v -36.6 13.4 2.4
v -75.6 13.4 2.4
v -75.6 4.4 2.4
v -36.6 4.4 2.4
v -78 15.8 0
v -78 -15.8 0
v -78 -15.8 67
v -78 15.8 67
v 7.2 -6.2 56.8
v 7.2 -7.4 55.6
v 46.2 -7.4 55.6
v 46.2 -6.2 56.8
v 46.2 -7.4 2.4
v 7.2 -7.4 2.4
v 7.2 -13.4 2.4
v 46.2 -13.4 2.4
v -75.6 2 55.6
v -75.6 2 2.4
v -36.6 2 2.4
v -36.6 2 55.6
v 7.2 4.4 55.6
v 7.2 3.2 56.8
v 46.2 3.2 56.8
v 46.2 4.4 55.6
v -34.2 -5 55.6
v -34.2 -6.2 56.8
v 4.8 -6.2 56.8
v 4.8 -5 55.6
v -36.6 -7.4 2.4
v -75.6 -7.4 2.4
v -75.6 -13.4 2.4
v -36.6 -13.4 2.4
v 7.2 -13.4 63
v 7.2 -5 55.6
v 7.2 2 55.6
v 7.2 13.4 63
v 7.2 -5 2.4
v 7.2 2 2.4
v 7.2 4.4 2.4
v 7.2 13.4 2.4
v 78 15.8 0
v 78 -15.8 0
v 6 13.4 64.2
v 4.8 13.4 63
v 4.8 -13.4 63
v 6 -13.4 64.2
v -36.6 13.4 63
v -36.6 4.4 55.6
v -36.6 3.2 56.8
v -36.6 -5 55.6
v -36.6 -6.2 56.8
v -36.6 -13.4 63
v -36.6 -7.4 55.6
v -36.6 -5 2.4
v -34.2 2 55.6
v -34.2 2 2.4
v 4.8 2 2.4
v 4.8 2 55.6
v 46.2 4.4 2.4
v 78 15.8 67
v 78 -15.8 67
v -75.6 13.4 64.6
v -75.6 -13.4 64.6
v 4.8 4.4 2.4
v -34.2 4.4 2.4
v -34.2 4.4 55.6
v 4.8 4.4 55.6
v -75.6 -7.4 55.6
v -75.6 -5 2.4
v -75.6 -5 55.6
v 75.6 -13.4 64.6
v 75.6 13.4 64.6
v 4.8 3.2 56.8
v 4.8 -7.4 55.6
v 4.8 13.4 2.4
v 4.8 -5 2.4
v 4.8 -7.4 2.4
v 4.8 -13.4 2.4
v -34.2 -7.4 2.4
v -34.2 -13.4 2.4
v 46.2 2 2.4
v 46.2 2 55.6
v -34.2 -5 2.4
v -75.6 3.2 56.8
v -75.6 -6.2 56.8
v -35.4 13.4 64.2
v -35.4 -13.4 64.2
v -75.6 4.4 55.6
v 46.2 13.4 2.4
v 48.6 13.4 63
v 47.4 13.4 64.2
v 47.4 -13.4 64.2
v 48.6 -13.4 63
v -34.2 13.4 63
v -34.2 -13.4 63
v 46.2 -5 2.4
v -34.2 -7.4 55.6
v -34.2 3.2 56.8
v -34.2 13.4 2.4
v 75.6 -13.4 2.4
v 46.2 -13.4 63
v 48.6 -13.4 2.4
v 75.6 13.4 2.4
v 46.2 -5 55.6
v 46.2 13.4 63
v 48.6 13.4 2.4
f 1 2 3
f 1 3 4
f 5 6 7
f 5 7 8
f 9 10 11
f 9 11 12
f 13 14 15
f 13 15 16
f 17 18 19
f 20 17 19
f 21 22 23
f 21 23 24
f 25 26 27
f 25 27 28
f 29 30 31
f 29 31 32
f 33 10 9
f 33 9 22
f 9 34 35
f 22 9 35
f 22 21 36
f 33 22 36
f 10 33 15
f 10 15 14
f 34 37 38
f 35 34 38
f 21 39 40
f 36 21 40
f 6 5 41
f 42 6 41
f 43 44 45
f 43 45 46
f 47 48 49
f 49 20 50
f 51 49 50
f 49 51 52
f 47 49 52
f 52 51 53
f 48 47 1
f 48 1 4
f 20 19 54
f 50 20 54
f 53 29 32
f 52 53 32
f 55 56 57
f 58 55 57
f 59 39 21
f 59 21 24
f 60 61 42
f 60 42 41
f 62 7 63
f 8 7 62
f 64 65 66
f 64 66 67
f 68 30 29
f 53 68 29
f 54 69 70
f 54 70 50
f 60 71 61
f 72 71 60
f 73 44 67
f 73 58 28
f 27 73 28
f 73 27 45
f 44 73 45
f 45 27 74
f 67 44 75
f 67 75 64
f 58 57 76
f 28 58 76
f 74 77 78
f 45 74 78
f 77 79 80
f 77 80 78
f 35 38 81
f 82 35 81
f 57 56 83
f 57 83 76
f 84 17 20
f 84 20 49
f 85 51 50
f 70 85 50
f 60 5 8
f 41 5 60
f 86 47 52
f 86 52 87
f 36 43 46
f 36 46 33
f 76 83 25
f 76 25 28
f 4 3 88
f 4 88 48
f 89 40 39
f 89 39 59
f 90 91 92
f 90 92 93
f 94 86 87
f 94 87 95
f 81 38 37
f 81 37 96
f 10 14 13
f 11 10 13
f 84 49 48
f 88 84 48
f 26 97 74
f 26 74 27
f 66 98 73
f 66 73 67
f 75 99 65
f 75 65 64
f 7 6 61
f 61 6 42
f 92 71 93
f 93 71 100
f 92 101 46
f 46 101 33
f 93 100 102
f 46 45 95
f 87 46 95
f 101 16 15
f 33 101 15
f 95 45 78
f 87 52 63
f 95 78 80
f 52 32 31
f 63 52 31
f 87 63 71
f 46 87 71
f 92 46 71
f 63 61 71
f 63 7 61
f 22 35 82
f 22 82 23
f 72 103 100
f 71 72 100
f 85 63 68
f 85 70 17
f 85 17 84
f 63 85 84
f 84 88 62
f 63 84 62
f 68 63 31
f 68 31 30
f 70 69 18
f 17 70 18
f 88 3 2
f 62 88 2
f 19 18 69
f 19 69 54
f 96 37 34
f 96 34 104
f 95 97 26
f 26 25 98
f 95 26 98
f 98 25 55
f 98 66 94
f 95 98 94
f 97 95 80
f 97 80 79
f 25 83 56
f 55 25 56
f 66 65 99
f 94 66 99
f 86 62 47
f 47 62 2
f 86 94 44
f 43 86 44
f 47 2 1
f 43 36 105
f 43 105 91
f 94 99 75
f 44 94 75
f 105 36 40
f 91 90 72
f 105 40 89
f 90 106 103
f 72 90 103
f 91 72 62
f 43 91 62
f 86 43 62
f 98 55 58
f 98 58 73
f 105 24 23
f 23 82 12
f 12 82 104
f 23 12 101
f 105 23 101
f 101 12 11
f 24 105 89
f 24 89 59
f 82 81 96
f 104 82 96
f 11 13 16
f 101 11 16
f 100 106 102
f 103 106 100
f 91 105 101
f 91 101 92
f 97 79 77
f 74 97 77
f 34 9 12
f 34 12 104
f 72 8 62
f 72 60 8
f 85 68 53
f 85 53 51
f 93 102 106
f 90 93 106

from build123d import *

# Parameters (mm, degrees)
F0_W          = 156
F0_H          = 31.6
F1_DEPTH      = 67
F0_W_2        = 2.4
F0_H_2        = 6
F0_H_3        = 2.4
F0_H_4        = 7
F0_H_5        = 9
F2_DEPTH      = 65.4
F0_W_3        = 39
F3_DEPTH      = 58
F4_DEPTH      = 2.4
F0_W_4        = 27
F5_DEPTH      = 2.4
F6_T1_DEPTH   = 39
F6_T3_DEPTH   = 39
F6_T5_DEPTH   = 39
F6_T7_DEPTH   = 26.8
F6_T12_DEPTH  = 51.3440783422
F6_T17_DEPTH  = 51.3440783422
F6_T22_DEPTH  = 51.3440783422
F6_T27_DEPTH  = 51.3440783422
F6_T32_DEPTH  = 51.3440783422
F6_T37_DEPTH  = 51.3440783422
F6_T42_DEPTH  = 51.3440783422
F6_T47_DEPTH  = 51.3440783422
F6_T52_DEPTH  = 51.3440783422
F6_T57_DEPTH  = 51.3440783422
F6_T62_DEPTH  = 51.3440783422
F6_T67_DEPTH  = 51.3440783422
F6_T72_DEPTH  = 51.3440783422
F6_T77_DEPTH  = 51.3440783422
F6_T82_DEPTH  = 51.3440783422
F6_T87_DEPTH  = 51.3440783422
F6_T92_DEPTH  = 163.5440783422
F6_T98_DEPTH  = 163.5440783422
F6_T104_DEPTH = 39.1440783422
F6_T110_DEPTH = 39.1440783422


# Not quite as in the source:
# - a fillet or chamfer that OpenCascade refuses, or shapes differently, is made with other operations: its cross-section is extruded or revolved along the edge and cut away or added


with BuildPart() as f1:
    # F0 (on Top) → F1 (new body)
    with BuildSketch(Plane.XY):
        Rectangle(F0_W, F0_H)
        Polygon((48.6, 13.4), (75.6, 13.4), (75.6, 4.4), (75.6, 2), (75.6, -5), (75.6, -7.4), (75.6, -13.4), (48.6, -13.4), (46.2, -13.4), (7.2, -13.4), (4.8, -13.4), (-34.2, -13.4), (-36.6, -13.4), (-75.6, -13.4), (-75.6, -7.4), (-75.6, -5), (-75.6, 2), (-75.6, 4.4), (-75.6, 13.4), (-36.6, 13.4), (-34.2, 13.4), (4.8, 13.4), (7.2, 13.4), (46.2, 13.4), align=None, mode=Mode.SUBTRACT)
    extrude(amount=F1_DEPTH)

    # F0 (on Top) → F2 (join)
    with BuildSketch(Plane.XY):
        with Locations((47.4, -10.4)):
            Rectangle(F0_W_2, F0_H_2)
        with Locations((47.4, -6.2)):
            Rectangle(F0_W_2, F0_H_3)
        with Locations((47.4, -1.5)):
            Rectangle(F0_W_2, F0_H_4)
        with Locations((47.4, 3.2)):
            Rectangle(F0_W_2, F0_H_3)
        with Locations((47.4, 8.9)):
            Rectangle(F0_W_2, F0_H_5)
        with Locations((6, 8.9)):
            Rectangle(F0_W_2, F0_H_5)
        with Locations((6, 3.2)):
            Rectangle(F0_W_2, F0_H_3)
        with Locations((6, -1.5)):
            Rectangle(F0_W_2, F0_H_4)
        with Locations((6, -6.2)):
            Rectangle(F0_W_2, F0_H_3)
        with Locations((6, -10.4)):
            Rectangle(F0_W_2, F0_H_2)
        with Locations((-35.4, -10.4)):
            Rectangle(F0_W_2, F0_H_2)
        with Locations((-35.4, -6.2)):
            Rectangle(F0_W_2, F0_H_3)
        with Locations((-35.4, -1.5)):
            Rectangle(F0_W_2, F0_H_4)
        with Locations((-35.4, 3.2)):
            Rectangle(F0_W_2, F0_H_3)
        with Locations((-35.4, 8.9)):
            Rectangle(F0_W_2, F0_H_5)
    extrude(amount=F2_DEPTH)

    # F0 (on Top) → F3 (join)
    with BuildSketch(Plane.XY):
        with Locations((-56.1, -6.2)):
            Rectangle(F0_W_3, F0_H_3)
        with Locations((-56.1, 3.2)):
            Rectangle(F0_W_3, F0_H_3)
        with Locations((-14.7, -6.2)):
            Rectangle(F0_W_3, F0_H_3)
        with Locations((-14.7, 3.2)):
            Rectangle(F0_W_3, F0_H_3)
        with Locations((26.7, 3.2)):
            Rectangle(F0_W_3, F0_H_3)
        with Locations((26.7, -6.2)):
            Rectangle(F0_W_3, F0_H_3)
    extrude(amount=F3_DEPTH)

    # F0 (on Top) → F4 (join)
    with BuildSketch(Plane.XY):
        with Locations((-56.1, -10.4)):
            Rectangle(F0_W_3, F0_H_2)
        with Locations((-56.1, -1.5)):
            Rectangle(F0_W_3, F0_H_4)
        with Locations((-56.1, 8.9)):
            Rectangle(F0_W_3, F0_H_5)
        with Locations((-14.7, 8.9)):
            Rectangle(F0_W_3, F0_H_5)
        with Locations((-14.7, -1.5)):
            Rectangle(F0_W_3, F0_H_4)
        with Locations((-14.7, -10.4)):
            Rectangle(F0_W_3, F0_H_2)
        with Locations((26.7, -10.4)):
            Rectangle(F0_W_3, F0_H_2)
        with Locations((26.7, -1.5)):
            Rectangle(F0_W_3, F0_H_4)
        with Locations((26.7, 8.9)):
            Rectangle(F0_W_3, F0_H_5)
    extrude(amount=F4_DEPTH)

    # F0 (on Top) → F5 (join)
    with BuildSketch(Plane.XY):
        with Locations((62.1, 8.9)):
            Rectangle(F0_W_4, F0_H_5)
        with Locations((62.1, 3.2)):
            Rectangle(F0_W_4, F0_H_3)
        with Locations((62.1, -1.5)):
            Rectangle(F0_W_4, F0_H_4)
        with Locations((62.1, -6.2)):
            Rectangle(F0_W_4, F0_H_3)
        with Locations((62.1, -10.4)):
            Rectangle(F0_W_4, F0_H_2)
    extrude(amount=F5_DEPTH)

    # F6: chamfer of 2.4 on 22 edges, made by hand

    # F6_s2 → F6_t1 (cut)
    with BuildSketch(Plane.YZ.offset(-75.6)):
        Polygon((2, 55.6), (4.4, 58), (2, 58), align=None)
        Polygon((2, 58), (4.4, 55.6), (4.4, 58), align=None)
        Polygon((-7.4, 58), (-5, 55.6), (-5, 58), align=None)
        Polygon((-7.4, 55.6), (-5, 58), (-7.4, 58), align=None)
    extrude(amount=F6_T1_DEPTH, mode=Mode.SUBTRACT)

    # F6_s4 → F6_t3 (cut)
    with BuildSketch(Plane.YZ.offset(-34.2)):
        Polygon((-7.4, 55.6), (-5, 58), (-7.4, 58), align=None)
        Polygon((-7.4, 58), (-5, 55.6), (-5, 58), align=None)
        Polygon((2, 58), (4.4, 55.6), (4.4, 58), align=None)
        Polygon((2, 55.6), (4.4, 58), (2, 58), align=None)
    extrude(amount=F6_T3_DEPTH, mode=Mode.SUBTRACT)

    # F6_s6 → F6_t5 (cut)
    with BuildSketch(Plane.YZ.offset(7.2)):
        Polygon((2, 55.6), (4.4, 58), (2, 58), align=None)
        Polygon((2, 58), (4.4, 55.6), (4.4, 58), align=None)
        Polygon((-7.4, 55.6), (-5, 58), (-7.4, 58), align=None)
        Polygon((-7.4, 58), (-5, 55.6), (-5, 58), align=None)
    extrude(amount=F6_T5_DEPTH, mode=Mode.SUBTRACT)

    # F6_s8 → F6_t7 (cut)
    with BuildSketch(Plane.XZ.offset(-13.4)):
        Polygon((-36.6, 63), (-34.2, 65.4), (-36.6, 65.4), align=None)
        Polygon((-36.6, 65.4), (-34.2, 63), (-34.2, 65.4), align=None)
        Polygon((4.8, 63), (7.2, 65.4), (4.8, 65.4), align=None)
        Polygon((4.8, 65.4), (7.2, 63), (7.2, 65.4), align=None)
        Polygon((46.2, 63), (48.6, 65.4), (46.2, 65.4), align=None)
        Polygon((46.2, 65.4), (48.6, 63), (48.6, 65.4), align=None)
    extrude(amount=F6_T7_DEPTH, mode=Mode.SUBTRACT)


with BuildPart() as f6_tool10:
    # F6_s11 → F6_t12 (new body)
    with BuildSketch(Plane.YZ.offset(-81.7720391711)):
        Polygon((2, 55.6), (4.4, 58), (2, 58), align=None)
    extrude(amount=F6_T12_DEPTH)

    split(bisect_by=Plane.YZ.offset(-34.2), keep=Keep.TOP)


with BuildPart() as f1_1:
    add(f1.part)

    # F6_t9: cut F6_tool10
    add(f6_tool10.part, mode=Mode.SUBTRACT)


with BuildPart() as f6_tool15:
    # F6_s16 → F6_t17 (new body)
    with BuildSketch(Plane.YZ.offset(-30.4279608289)):
        Polygon((2, 58), (4.4, 55.6), (4.4, 58), align=None)
    extrude(amount=-F6_T17_DEPTH)

    split(bisect_by=Plane.YZ.offset(-34.2), keep=Keep.TOP)


with BuildPart() as f1_2:
    add(f1_1.part)

    # F6_t14: cut F6_tool15
    add(f6_tool15.part, mode=Mode.SUBTRACT)


with BuildPart() as f6_tool20:
    # F6_s21 → F6_t22 (new body)
    with BuildSketch(Plane.YZ.offset(-30.4279608289)):
        Polygon((-7.4, 58), (-5, 55.6), (-5, 58), align=None)
    extrude(amount=-F6_T22_DEPTH)

    split(bisect_by=Plane.YZ.offset(-34.2), keep=Keep.TOP)


with BuildPart() as f1_3:
    add(f1_2.part)

    # F6_t19: cut F6_tool20
    add(f6_tool20.part, mode=Mode.SUBTRACT)


with BuildPart() as f6_tool25:
    # F6_s26 → F6_t27 (new body)
    with BuildSketch(Plane.YZ.offset(-81.7720391711)):
        Polygon((-7.4, 55.6), (-5, 58), (-7.4, 58), align=None)
    extrude(amount=F6_T27_DEPTH)

    split(bisect_by=Plane.YZ.offset(-34.2), keep=Keep.TOP)


with BuildPart() as f1_4:
    add(f1_3.part)

    # F6_t24: cut F6_tool25
    add(f6_tool25.part, mode=Mode.SUBTRACT)


with BuildPart() as f6_tool30:
    # F6_s31 → F6_t32 (new body)
    with BuildSketch(Plane.YZ.offset(-40.3720391711)):
        Polygon((-7.4, 55.6), (-5, 58), (-7.4, 58), align=None)
    extrude(amount=F6_T32_DEPTH)

    split(bisect_by=Plane.YZ.offset(-36.6), keep=Keep.BOTTOM)


with BuildPart() as f1_5:
    add(f1_4.part)

    # F6_t29: cut F6_tool30
    add(f6_tool30.part, mode=Mode.SUBTRACT)


with BuildPart() as f6_tool35:
    # F6_s36 → F6_t37 (new body)
    with BuildSketch(Plane.YZ.offset(-40.3720391711)):
        Polygon((-7.4, 55.6), (-5, 58), (-7.4, 58), align=None)
    extrude(amount=F6_T37_DEPTH)

    split(bisect_by=Plane.YZ.offset(7.2), keep=Keep.TOP)


with BuildPart() as f1_6:
    add(f1_5.part)

    # F6_t34: cut F6_tool35
    add(f6_tool35.part, mode=Mode.SUBTRACT)


with BuildPart() as f6_tool40:
    # F6_s41 → F6_t42 (new body)
    with BuildSketch(Plane.YZ.offset(10.9720391711)):
        Polygon((-7.4, 58), (-5, 55.6), (-5, 58), align=None)
    extrude(amount=-F6_T42_DEPTH)

    split(bisect_by=Plane.YZ.offset(7.2), keep=Keep.TOP)


with BuildPart() as f1_7:
    add(f1_6.part)

    # F6_t39: cut F6_tool40
    add(f6_tool40.part, mode=Mode.SUBTRACT)


with BuildPart() as f6_tool45:
    # F6_s46 → F6_t47 (new body)
    with BuildSketch(Plane.YZ.offset(10.9720391711)):
        Polygon((-7.4, 58), (-5, 55.6), (-5, 58), align=None)
    extrude(amount=-F6_T47_DEPTH)

    split(bisect_by=Plane.YZ.offset(-36.6), keep=Keep.BOTTOM)


with BuildPart() as f1_8:
    add(f1_7.part)

    # F6_t44: cut F6_tool45
    add(f6_tool45.part, mode=Mode.SUBTRACT)


with BuildPart() as f6_tool50:
    # F6_s51 → F6_t52 (new body)
    with BuildSketch(Plane.YZ.offset(10.9720391711)):
        Polygon((2, 58), (4.4, 55.6), (4.4, 58), align=None)
    extrude(amount=-F6_T52_DEPTH)

    split(bisect_by=Plane.YZ.offset(7.2), keep=Keep.TOP)


with BuildPart() as f1_9:
    add(f1_8.part)

    # F6_t49: cut F6_tool50
    add(f6_tool50.part, mode=Mode.SUBTRACT)


with BuildPart() as f6_tool55:
    # F6_s56 → F6_t57 (new body)
    with BuildSketch(Plane.YZ.offset(10.9720391711)):
        Polygon((2, 58), (4.4, 55.6), (4.4, 58), align=None)
    extrude(amount=-F6_T57_DEPTH)

    split(bisect_by=Plane.YZ.offset(-36.6), keep=Keep.BOTTOM)


with BuildPart() as f1_10:
    add(f1_9.part)

    # F6_t54: cut F6_tool55
    add(f6_tool55.part, mode=Mode.SUBTRACT)


with BuildPart() as f6_tool60:
    # F6_s61 → F6_t62 (new body)
    with BuildSketch(Plane.YZ.offset(-40.3720391711)):
        Polygon((2, 55.6), (4.4, 58), (2, 58), align=None)
    extrude(amount=F6_T62_DEPTH)

    split(bisect_by=Plane.YZ.offset(-36.6), keep=Keep.BOTTOM)


with BuildPart() as f1_11:
    add(f1_10.part)

    # F6_t59: cut F6_tool60
    add(f6_tool60.part, mode=Mode.SUBTRACT)


with BuildPart() as f6_tool65:
    # F6_s66 → F6_t67 (new body)
    with BuildSketch(Plane.YZ.offset(-40.3720391711)):
        Polygon((2, 55.6), (4.4, 58), (2, 58), align=None)
    extrude(amount=F6_T67_DEPTH)

    split(bisect_by=Plane.YZ.offset(7.2), keep=Keep.TOP)


with BuildPart() as f1_12:
    add(f1_11.part)

    # F6_t64: cut F6_tool65
    add(f6_tool65.part, mode=Mode.SUBTRACT)


with BuildPart() as f6_tool70:
    # F6_s71 → F6_t72 (new body)
    with BuildSketch(Plane.YZ.offset(1.0279608289)):
        Polygon((2, 55.6), (4.4, 58), (2, 58), align=None)
    extrude(amount=F6_T72_DEPTH)

    split(bisect_by=Plane.YZ.offset(4.8), keep=Keep.BOTTOM)


with BuildPart() as f1_13:
    add(f1_12.part)

    # F6_t69: cut F6_tool70
    add(f6_tool70.part, mode=Mode.SUBTRACT)


with BuildPart() as f6_tool75:
    # F6_s76 → F6_t77 (new body)
    with BuildSketch(Plane.YZ.offset(52.3720391711)):
        Polygon((2, 58), (4.4, 55.6), (4.4, 58), align=None)
    extrude(amount=-F6_T77_DEPTH)

    split(bisect_by=Plane.YZ.offset(4.8), keep=Keep.BOTTOM)


with BuildPart() as f1_14:
    add(f1_13.part)

    # F6_t74: cut F6_tool75
    add(f6_tool75.part, mode=Mode.SUBTRACT)


with BuildPart() as f6_tool80:
    # F6_s81 → F6_t82 (new body)
    with BuildSketch(Plane.YZ.offset(1.0279608289)):
        Polygon((-7.4, 55.6), (-5, 58), (-7.4, 58), align=None)
    extrude(amount=F6_T82_DEPTH)

    split(bisect_by=Plane.YZ.offset(4.8), keep=Keep.BOTTOM)


with BuildPart() as f1_15:
    add(f1_14.part)

    # F6_t79: cut F6_tool80
    add(f6_tool80.part, mode=Mode.SUBTRACT)


with BuildPart() as f6_tool85:
    # F6_s86 → F6_t87 (new body)
    with BuildSketch(Plane.YZ.offset(52.3720391711)):
        Polygon((-7.4, 58), (-5, 55.6), (-5, 58), align=None)
    extrude(amount=-F6_T87_DEPTH)

    split(bisect_by=Plane.YZ.offset(4.8), keep=Keep.BOTTOM)


with BuildPart() as f1_16:
    add(f1_15.part)

    # F6_t84: cut F6_tool85
    add(f6_tool85.part, mode=Mode.SUBTRACT)


with BuildPart() as f6_tool90:
    # F6_s91 → F6_t92 (new body)
    with BuildSketch(Plane.YZ.offset(81.7720391711)):
        Polygon((15.8, 67), (13.4, 64.6), (13.4, 67), align=None)
    extrude(amount=-F6_T92_DEPTH)

    split(bisect_by=Plane(origin=(5.5, 0, -5.5), x_dir=(0, 1, 0), z_dir=(-0.7071067812, 0, 0.7071067812)), keep=Keep.TOP)

    split(bisect_by=Plane(origin=(-5.5, 0, -5.5), x_dir=(0, 1, 0), z_dir=(0.7071067812, 0, 0.7071067812)), keep=Keep.TOP)


with BuildPart() as f1_17:
    add(f1_16.part)

    # F6_t89: cut F6_tool90
    add(f6_tool90.part, mode=Mode.SUBTRACT)


with BuildPart() as f6_tool96:
    # F6_s97 → F6_t98 (new body)
    with BuildSketch(Plane.YZ.offset(-81.7720391711)):
        Polygon((-15.8, 67), (-13.4, 64.6), (-13.4, 67), align=None)
    extrude(amount=F6_T98_DEPTH)

    split(bisect_by=Plane(origin=(5.5, 0, -5.5), x_dir=(0, 1, 0), z_dir=(-0.7071067812, 0, 0.7071067812)), keep=Keep.TOP)

    split(bisect_by=Plane(origin=(-5.5, 0, -5.5), x_dir=(0, 1, 0), z_dir=(0.7071067812, 0, 0.7071067812)), keep=Keep.TOP)


with BuildPart() as f1_18:
    add(f1_17.part)

    # F6_t95: cut F6_tool96
    add(f6_tool96.part, mode=Mode.SUBTRACT)


with BuildPart() as f6_tool102:
    # F6_s103 → F6_t104 (new body)
    with BuildSketch(Plane.XZ.offset(-19.5720391711)):
        Polygon((-78, 67), (-75.6, 64.6), (-75.6, 67), align=None)
    extrude(amount=F6_T104_DEPTH)

    split(bisect_by=Plane(origin=(0, -25.6, 25.6), x_dir=(1, 0, 0), z_dir=(0, -0.7071067812, 0.7071067812)), keep=Keep.TOP)

    split(bisect_by=Plane(origin=(0, 25.6, 25.6), x_dir=(1, 0, 0), z_dir=(0, 0.7071067812, 0.7071067812)), keep=Keep.TOP)


with BuildPart() as f1_19:
    add(f1_18.part)

    # F6_t101: cut F6_tool102
    add(f6_tool102.part, mode=Mode.SUBTRACT)


with BuildPart() as f6_tool108:
    # F6_s109 → F6_t110 (new body)
    with BuildSketch(Plane.XZ.offset(19.5720391711)):
        Polygon((78, 67), (75.6, 64.6), (75.6, 67), align=None)
    extrude(amount=-F6_T110_DEPTH)

    split(bisect_by=Plane(origin=(0, -25.6, 25.6), x_dir=(1, 0, 0), z_dir=(0, -0.7071067812, 0.7071067812)), keep=Keep.TOP)

    split(bisect_by=Plane(origin=(0, 25.6, 25.6), x_dir=(1, 0, 0), z_dir=(0, 0.7071067812, 0.7071067812)), keep=Keep.TOP)


with BuildPart() as f1_20:
    add(f1_19.part)

    # F6_t107: cut F6_tool108
    add(f6_tool108.part, mode=Mode.SUBTRACT)


solid = f1_20.part
